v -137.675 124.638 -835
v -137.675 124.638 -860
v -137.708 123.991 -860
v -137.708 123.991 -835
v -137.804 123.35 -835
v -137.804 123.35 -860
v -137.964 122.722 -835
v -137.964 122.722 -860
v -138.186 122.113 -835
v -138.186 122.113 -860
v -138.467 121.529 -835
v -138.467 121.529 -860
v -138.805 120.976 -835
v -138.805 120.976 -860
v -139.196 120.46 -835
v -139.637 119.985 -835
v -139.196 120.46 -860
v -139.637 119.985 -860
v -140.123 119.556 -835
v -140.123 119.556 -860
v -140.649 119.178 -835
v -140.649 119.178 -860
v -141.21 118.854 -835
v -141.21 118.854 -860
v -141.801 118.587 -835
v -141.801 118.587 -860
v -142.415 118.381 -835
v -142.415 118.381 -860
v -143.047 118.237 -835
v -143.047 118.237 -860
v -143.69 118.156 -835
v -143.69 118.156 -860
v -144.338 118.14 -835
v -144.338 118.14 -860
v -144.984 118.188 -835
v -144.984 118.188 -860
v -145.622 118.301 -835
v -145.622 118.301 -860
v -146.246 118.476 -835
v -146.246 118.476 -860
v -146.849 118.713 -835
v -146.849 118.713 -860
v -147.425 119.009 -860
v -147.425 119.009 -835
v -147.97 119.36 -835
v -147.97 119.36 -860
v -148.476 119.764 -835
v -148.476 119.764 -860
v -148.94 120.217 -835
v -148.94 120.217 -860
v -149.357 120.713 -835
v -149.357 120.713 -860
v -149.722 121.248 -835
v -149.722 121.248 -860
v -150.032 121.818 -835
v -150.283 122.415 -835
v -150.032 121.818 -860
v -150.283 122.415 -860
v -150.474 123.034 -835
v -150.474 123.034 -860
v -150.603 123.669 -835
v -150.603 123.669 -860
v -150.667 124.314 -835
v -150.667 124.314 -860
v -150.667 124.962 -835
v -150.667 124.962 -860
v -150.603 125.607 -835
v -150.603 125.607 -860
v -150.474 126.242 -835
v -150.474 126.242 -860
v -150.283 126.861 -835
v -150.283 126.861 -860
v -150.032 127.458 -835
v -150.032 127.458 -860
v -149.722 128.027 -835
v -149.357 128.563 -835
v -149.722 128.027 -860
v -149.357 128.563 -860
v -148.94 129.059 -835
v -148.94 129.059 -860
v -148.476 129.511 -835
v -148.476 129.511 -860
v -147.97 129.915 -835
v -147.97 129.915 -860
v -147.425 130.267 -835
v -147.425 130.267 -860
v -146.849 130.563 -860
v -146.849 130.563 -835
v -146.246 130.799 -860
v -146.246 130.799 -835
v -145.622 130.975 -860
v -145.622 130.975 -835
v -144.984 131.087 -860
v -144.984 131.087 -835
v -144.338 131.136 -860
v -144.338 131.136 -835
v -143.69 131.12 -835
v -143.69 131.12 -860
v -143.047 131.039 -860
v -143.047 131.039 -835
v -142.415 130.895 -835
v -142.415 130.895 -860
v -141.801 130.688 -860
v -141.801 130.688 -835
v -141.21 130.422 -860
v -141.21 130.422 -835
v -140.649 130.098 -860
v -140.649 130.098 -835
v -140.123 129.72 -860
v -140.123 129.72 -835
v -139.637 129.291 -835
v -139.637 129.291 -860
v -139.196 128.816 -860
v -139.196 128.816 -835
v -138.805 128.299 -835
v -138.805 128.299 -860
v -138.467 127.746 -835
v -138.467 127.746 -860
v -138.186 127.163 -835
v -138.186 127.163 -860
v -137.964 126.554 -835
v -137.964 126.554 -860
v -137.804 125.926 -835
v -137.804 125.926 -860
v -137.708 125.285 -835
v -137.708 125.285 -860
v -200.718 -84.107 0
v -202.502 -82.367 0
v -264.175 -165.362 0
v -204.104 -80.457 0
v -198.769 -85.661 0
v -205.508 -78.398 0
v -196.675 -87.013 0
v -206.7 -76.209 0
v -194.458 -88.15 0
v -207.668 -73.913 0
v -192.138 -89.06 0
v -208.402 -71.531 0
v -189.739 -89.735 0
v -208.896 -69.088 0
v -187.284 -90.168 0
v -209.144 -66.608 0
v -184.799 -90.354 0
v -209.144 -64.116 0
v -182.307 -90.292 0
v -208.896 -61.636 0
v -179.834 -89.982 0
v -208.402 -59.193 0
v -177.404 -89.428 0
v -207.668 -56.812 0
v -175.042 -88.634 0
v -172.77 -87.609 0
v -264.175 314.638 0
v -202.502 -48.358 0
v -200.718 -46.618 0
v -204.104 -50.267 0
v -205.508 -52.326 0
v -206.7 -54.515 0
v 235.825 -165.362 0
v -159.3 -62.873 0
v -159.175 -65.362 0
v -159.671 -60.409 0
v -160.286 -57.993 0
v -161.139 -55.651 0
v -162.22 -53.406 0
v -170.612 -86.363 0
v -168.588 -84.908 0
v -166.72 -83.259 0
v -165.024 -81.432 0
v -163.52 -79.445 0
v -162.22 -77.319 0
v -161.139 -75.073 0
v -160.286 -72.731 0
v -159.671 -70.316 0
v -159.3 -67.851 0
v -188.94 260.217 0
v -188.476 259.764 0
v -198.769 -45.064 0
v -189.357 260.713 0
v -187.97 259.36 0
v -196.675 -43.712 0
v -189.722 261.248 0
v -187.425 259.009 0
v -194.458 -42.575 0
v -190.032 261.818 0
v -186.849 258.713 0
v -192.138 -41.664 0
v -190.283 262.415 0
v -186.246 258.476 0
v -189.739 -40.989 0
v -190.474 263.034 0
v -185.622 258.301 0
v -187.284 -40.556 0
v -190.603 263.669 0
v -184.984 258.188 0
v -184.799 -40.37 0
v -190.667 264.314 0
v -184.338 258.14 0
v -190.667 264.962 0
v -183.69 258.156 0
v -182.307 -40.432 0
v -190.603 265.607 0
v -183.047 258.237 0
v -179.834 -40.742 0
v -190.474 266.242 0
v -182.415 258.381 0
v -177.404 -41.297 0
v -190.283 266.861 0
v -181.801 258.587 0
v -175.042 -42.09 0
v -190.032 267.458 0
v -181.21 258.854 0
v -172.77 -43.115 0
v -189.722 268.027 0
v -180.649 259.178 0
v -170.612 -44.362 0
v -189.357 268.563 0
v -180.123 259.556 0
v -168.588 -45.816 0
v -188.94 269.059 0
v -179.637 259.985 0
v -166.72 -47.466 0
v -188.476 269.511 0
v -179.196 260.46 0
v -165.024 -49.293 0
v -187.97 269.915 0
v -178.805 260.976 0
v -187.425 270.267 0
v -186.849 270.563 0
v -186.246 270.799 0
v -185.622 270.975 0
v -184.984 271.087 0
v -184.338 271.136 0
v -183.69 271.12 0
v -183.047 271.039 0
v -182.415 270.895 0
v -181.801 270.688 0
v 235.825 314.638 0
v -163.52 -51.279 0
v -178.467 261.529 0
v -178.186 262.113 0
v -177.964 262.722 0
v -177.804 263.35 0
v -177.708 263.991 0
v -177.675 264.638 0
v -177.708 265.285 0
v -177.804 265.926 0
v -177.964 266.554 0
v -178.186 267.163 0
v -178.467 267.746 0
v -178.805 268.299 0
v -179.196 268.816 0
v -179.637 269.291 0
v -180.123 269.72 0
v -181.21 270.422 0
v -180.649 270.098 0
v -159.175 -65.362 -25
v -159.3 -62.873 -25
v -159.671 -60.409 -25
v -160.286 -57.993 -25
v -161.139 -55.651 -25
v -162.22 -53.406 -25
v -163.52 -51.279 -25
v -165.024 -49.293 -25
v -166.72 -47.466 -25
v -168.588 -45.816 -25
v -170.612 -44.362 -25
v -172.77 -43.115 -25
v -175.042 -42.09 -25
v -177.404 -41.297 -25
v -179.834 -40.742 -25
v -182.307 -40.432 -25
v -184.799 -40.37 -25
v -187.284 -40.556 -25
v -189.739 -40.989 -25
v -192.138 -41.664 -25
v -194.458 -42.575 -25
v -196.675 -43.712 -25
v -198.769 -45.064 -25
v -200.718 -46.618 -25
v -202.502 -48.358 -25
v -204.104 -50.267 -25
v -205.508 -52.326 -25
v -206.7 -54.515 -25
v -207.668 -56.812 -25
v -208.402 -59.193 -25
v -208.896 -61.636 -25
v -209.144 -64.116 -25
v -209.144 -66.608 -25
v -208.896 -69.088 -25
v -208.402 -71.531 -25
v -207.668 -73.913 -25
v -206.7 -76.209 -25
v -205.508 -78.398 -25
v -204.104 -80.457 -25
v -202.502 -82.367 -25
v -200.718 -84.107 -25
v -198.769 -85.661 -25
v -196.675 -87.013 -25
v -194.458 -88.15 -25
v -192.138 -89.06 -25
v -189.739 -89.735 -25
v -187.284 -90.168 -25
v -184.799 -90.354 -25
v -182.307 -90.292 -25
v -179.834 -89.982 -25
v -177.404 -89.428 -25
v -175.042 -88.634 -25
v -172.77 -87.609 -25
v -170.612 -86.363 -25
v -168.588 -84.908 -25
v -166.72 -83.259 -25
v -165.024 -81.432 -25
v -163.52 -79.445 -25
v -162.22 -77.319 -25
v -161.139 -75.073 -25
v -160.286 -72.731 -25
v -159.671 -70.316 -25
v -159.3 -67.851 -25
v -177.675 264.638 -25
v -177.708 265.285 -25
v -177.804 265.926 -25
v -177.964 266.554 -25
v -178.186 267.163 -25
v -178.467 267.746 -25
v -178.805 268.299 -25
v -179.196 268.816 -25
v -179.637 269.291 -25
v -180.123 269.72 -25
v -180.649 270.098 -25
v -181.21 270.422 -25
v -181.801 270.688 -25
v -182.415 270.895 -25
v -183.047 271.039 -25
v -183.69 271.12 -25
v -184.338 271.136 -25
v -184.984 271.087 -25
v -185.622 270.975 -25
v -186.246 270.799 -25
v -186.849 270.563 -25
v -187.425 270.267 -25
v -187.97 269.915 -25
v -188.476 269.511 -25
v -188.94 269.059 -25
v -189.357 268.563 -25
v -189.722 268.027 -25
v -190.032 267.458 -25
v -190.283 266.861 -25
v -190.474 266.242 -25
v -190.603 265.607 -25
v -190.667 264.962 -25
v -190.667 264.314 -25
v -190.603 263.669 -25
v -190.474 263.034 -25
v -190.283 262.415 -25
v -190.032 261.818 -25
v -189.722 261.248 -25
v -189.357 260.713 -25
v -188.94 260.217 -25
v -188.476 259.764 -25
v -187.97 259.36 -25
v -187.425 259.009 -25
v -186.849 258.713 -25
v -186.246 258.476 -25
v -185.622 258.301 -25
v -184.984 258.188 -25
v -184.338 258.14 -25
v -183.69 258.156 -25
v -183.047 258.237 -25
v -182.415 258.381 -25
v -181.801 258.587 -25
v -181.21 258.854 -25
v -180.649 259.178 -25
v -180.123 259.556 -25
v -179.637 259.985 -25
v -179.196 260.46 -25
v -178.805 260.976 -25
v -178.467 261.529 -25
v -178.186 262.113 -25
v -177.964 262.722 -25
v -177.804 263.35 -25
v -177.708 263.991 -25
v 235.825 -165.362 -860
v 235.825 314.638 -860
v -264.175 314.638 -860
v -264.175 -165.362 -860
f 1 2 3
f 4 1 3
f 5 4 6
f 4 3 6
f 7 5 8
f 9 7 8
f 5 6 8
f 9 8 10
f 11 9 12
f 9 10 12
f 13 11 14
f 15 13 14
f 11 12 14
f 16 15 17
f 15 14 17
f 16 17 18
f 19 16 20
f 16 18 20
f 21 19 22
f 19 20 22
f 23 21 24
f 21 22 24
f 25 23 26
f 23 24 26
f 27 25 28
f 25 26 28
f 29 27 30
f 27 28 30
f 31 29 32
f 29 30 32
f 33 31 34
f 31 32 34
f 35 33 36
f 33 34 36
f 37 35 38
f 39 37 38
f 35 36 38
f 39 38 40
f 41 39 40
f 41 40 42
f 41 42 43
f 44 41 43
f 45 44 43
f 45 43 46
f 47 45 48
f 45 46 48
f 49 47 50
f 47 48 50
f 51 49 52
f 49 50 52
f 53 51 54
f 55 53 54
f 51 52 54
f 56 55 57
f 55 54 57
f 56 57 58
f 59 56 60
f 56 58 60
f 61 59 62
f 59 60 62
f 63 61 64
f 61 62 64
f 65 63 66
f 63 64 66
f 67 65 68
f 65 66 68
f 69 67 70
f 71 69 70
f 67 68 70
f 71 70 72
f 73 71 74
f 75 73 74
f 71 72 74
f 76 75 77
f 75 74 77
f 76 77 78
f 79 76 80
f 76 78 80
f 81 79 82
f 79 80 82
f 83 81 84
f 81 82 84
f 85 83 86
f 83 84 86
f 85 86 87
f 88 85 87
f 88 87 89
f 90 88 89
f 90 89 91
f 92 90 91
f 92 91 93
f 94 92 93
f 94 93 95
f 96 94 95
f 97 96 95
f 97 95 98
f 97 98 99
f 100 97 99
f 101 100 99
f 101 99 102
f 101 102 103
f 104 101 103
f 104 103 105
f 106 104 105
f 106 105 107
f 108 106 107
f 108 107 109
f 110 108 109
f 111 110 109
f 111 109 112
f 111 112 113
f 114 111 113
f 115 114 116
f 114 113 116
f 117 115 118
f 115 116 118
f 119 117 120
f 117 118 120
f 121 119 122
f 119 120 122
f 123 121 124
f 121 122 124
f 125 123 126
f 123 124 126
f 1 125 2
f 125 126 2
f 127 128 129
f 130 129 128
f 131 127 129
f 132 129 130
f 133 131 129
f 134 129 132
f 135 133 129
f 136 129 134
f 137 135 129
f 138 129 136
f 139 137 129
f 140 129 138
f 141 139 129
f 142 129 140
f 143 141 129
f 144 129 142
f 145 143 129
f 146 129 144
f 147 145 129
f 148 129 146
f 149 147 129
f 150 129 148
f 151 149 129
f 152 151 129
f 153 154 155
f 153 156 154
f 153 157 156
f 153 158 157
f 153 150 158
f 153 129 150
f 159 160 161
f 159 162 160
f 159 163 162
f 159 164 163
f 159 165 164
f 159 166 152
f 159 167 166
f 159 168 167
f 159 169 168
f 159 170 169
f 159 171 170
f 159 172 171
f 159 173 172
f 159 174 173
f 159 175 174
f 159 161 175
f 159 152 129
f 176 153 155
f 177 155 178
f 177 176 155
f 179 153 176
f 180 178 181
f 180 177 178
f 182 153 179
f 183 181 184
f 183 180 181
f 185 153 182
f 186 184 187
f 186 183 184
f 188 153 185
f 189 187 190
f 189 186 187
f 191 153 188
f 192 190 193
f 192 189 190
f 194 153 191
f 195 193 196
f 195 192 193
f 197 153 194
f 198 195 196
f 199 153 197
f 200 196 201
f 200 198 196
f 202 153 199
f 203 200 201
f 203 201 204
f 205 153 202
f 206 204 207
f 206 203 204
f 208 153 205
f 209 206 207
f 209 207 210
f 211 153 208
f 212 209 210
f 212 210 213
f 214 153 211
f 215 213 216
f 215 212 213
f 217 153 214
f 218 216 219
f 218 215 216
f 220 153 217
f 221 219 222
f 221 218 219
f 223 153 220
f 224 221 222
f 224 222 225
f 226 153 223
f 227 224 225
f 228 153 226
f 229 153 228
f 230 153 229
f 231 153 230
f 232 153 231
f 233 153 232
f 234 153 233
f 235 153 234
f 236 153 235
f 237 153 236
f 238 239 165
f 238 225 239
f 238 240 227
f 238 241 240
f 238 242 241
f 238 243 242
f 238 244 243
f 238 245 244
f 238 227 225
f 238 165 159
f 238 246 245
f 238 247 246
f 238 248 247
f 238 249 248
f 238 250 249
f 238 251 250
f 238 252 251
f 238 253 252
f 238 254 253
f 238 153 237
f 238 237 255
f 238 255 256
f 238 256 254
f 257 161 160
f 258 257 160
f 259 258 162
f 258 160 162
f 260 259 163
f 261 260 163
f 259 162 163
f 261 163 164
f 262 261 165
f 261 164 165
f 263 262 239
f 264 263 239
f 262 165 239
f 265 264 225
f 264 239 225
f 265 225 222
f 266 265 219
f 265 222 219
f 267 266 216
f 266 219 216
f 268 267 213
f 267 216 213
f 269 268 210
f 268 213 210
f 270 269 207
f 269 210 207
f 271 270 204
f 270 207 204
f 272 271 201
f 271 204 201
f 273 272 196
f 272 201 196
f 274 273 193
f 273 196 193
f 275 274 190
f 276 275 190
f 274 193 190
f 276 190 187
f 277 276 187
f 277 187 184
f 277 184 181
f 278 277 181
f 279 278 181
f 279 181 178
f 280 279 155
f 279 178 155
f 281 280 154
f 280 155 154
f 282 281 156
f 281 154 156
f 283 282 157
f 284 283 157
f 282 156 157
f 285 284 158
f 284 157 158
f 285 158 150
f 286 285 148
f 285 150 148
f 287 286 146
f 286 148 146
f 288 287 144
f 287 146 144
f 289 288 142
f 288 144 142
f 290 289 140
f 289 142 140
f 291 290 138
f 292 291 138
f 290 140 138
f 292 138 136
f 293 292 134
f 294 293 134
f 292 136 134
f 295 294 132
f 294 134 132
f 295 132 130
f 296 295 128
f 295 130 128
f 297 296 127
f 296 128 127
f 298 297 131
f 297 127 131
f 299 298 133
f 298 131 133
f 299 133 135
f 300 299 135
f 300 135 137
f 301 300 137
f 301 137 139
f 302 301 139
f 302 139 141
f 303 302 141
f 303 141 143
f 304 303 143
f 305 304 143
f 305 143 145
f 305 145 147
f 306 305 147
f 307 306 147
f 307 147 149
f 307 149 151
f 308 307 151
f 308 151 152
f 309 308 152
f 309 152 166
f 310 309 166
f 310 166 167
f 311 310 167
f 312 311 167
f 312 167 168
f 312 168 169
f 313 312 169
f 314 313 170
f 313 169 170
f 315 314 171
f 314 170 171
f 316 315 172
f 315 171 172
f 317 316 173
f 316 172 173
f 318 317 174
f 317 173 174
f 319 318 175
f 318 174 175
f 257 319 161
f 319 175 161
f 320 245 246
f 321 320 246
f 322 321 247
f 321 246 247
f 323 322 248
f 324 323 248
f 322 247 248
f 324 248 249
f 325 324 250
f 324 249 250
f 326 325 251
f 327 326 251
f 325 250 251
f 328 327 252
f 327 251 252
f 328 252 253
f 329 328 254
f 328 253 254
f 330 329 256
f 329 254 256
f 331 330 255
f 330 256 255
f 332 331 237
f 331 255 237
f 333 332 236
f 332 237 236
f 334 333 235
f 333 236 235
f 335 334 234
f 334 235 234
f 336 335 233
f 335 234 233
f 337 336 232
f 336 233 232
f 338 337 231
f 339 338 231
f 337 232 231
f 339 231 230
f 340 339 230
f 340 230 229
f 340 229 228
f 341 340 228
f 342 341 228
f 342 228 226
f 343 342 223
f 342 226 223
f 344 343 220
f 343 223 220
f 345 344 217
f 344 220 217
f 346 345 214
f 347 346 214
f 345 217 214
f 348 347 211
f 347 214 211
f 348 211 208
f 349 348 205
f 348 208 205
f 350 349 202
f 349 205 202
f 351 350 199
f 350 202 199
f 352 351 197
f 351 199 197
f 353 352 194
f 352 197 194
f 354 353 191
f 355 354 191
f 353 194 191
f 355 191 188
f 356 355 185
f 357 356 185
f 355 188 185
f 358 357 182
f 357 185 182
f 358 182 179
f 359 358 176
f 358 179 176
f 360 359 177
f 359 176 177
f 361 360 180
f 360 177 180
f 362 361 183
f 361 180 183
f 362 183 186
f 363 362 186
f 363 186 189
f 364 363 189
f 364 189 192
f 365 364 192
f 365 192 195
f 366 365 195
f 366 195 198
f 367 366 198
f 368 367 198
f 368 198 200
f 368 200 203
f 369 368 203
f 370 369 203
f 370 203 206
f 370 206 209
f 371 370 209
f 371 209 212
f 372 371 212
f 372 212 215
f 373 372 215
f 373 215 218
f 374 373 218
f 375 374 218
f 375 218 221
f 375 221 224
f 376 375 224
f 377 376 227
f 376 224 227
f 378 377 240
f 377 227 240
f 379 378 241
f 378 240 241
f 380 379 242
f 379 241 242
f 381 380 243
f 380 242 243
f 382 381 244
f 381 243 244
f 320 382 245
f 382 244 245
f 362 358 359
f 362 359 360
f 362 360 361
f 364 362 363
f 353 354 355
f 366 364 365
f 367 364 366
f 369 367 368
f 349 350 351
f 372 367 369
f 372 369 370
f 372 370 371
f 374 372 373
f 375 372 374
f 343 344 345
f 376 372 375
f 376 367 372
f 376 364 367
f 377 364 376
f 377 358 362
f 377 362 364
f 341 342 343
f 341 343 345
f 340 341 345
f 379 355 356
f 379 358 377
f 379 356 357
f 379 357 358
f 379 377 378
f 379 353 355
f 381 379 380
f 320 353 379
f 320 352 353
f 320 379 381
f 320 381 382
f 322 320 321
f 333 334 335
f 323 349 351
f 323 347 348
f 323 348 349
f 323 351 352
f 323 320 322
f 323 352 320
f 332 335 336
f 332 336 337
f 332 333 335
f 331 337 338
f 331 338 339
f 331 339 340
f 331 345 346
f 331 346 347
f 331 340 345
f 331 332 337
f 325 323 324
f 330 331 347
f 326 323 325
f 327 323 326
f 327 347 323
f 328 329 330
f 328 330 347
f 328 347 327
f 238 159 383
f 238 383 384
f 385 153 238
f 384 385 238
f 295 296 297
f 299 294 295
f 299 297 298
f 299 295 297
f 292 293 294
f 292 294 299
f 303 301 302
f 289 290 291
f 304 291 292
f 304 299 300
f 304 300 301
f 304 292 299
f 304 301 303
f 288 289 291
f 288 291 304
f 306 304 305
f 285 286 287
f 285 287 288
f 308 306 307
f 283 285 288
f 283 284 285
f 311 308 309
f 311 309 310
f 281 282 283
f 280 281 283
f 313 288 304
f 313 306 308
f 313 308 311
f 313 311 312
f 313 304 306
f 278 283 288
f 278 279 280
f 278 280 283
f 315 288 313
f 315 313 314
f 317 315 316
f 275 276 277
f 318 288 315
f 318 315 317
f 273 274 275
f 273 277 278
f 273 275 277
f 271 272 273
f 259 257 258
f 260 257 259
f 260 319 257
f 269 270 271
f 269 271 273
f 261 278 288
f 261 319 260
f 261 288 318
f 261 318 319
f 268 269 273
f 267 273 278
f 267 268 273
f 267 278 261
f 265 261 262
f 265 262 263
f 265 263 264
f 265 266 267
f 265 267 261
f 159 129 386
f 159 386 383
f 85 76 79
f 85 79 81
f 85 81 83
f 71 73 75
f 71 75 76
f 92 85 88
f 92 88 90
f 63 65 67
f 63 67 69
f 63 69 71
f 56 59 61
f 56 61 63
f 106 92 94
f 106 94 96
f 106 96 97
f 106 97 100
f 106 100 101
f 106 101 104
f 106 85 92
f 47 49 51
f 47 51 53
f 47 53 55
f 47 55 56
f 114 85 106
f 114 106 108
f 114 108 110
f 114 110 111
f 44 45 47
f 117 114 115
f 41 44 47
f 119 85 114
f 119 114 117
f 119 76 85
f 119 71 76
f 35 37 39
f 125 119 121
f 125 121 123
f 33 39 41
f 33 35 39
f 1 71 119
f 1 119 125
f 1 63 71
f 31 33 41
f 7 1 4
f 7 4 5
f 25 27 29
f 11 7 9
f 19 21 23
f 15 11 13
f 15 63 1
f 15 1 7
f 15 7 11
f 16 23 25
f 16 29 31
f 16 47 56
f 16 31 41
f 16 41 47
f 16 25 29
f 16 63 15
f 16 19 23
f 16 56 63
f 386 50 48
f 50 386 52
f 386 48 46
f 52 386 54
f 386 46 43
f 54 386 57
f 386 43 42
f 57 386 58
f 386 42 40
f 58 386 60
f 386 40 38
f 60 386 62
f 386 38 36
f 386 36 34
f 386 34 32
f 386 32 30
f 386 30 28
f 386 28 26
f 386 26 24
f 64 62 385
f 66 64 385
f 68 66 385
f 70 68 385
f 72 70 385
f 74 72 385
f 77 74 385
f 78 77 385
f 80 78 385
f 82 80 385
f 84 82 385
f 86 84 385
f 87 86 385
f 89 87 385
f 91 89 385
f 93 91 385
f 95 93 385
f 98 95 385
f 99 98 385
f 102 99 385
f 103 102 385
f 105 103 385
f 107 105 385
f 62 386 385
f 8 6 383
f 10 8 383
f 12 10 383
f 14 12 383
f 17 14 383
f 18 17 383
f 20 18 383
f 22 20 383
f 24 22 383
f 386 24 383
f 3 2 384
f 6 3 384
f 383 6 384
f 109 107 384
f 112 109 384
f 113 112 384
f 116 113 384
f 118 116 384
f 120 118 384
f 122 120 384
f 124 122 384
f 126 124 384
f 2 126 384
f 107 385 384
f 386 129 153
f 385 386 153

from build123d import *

# Parameters (mm, degrees)
F0_W     = 500
F0_H     = 480
F1_DEPTH = 860
F2_R     = 25
F2_R_2   = 6.5
F3_DEPTH = 25
F4_R     = 6.5
F5_DEPTH = 25


with BuildPart() as f1:
    # F0 (on Top) → F1 (new body)
    with BuildSketch(Plane.XY):
        with Locations((-14.175494, 74.637805)):
            Rectangle(F0_W, F0_H)
    extrude(amount=-F1_DEPTH)

    # F2 (on face) → F3 (cut)
    with BuildSketch(Plane.XY):
        with Locations((-184.175494, -65.362195)):
            Circle(F2_R)
        with Locations((-184.175494, 264.637805)):
            Circle(F2_R_2)
    extrude(amount=-F3_DEPTH, mode=Mode.SUBTRACT)

    # F4 (on face) → F5 (cut)
    with BuildSketch(Plane(origin=(0, 0, -860), x_dir=(1, 0, 0), z_dir=(0, 0, -1))):
        with Locations((-144.175494, -124.637805)):
            Circle(F4_R)
    extrude(amount=-F5_DEPTH, mode=Mode.SUBTRACT)


solid = f1.part
